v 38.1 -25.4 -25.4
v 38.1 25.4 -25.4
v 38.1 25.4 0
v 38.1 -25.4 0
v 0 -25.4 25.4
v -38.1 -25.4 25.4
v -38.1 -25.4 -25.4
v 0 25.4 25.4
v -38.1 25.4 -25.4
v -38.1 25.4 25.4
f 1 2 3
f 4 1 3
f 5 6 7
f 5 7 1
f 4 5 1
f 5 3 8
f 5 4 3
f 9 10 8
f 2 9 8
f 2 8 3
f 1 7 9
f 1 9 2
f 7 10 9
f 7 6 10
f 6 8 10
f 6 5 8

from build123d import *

# Parameters (mm, degrees)
F0_R     = 12.7
F1_DEPTH = 25.4


# Not quite as in the source:
# - the program builds the solid bodies; features that only make, move or delete a surface that nothing else refers to are left out


with BuildPart() as f1:
    # F0 (on Front) → F1 (new body, symmetric)
    with BuildSketch(Plane.XZ):
        Polygon((-38.1, 25.4), (-38.1, -25.4), (38.1, -25.4), (38.1, 0), (0, 25.4), align=None)
        Circle(F0_R, mode=Mode.SUBTRACT)
        Circle(F0_R)
    extrude(amount=F1_DEPTH, both=True)


solid = f1.part
